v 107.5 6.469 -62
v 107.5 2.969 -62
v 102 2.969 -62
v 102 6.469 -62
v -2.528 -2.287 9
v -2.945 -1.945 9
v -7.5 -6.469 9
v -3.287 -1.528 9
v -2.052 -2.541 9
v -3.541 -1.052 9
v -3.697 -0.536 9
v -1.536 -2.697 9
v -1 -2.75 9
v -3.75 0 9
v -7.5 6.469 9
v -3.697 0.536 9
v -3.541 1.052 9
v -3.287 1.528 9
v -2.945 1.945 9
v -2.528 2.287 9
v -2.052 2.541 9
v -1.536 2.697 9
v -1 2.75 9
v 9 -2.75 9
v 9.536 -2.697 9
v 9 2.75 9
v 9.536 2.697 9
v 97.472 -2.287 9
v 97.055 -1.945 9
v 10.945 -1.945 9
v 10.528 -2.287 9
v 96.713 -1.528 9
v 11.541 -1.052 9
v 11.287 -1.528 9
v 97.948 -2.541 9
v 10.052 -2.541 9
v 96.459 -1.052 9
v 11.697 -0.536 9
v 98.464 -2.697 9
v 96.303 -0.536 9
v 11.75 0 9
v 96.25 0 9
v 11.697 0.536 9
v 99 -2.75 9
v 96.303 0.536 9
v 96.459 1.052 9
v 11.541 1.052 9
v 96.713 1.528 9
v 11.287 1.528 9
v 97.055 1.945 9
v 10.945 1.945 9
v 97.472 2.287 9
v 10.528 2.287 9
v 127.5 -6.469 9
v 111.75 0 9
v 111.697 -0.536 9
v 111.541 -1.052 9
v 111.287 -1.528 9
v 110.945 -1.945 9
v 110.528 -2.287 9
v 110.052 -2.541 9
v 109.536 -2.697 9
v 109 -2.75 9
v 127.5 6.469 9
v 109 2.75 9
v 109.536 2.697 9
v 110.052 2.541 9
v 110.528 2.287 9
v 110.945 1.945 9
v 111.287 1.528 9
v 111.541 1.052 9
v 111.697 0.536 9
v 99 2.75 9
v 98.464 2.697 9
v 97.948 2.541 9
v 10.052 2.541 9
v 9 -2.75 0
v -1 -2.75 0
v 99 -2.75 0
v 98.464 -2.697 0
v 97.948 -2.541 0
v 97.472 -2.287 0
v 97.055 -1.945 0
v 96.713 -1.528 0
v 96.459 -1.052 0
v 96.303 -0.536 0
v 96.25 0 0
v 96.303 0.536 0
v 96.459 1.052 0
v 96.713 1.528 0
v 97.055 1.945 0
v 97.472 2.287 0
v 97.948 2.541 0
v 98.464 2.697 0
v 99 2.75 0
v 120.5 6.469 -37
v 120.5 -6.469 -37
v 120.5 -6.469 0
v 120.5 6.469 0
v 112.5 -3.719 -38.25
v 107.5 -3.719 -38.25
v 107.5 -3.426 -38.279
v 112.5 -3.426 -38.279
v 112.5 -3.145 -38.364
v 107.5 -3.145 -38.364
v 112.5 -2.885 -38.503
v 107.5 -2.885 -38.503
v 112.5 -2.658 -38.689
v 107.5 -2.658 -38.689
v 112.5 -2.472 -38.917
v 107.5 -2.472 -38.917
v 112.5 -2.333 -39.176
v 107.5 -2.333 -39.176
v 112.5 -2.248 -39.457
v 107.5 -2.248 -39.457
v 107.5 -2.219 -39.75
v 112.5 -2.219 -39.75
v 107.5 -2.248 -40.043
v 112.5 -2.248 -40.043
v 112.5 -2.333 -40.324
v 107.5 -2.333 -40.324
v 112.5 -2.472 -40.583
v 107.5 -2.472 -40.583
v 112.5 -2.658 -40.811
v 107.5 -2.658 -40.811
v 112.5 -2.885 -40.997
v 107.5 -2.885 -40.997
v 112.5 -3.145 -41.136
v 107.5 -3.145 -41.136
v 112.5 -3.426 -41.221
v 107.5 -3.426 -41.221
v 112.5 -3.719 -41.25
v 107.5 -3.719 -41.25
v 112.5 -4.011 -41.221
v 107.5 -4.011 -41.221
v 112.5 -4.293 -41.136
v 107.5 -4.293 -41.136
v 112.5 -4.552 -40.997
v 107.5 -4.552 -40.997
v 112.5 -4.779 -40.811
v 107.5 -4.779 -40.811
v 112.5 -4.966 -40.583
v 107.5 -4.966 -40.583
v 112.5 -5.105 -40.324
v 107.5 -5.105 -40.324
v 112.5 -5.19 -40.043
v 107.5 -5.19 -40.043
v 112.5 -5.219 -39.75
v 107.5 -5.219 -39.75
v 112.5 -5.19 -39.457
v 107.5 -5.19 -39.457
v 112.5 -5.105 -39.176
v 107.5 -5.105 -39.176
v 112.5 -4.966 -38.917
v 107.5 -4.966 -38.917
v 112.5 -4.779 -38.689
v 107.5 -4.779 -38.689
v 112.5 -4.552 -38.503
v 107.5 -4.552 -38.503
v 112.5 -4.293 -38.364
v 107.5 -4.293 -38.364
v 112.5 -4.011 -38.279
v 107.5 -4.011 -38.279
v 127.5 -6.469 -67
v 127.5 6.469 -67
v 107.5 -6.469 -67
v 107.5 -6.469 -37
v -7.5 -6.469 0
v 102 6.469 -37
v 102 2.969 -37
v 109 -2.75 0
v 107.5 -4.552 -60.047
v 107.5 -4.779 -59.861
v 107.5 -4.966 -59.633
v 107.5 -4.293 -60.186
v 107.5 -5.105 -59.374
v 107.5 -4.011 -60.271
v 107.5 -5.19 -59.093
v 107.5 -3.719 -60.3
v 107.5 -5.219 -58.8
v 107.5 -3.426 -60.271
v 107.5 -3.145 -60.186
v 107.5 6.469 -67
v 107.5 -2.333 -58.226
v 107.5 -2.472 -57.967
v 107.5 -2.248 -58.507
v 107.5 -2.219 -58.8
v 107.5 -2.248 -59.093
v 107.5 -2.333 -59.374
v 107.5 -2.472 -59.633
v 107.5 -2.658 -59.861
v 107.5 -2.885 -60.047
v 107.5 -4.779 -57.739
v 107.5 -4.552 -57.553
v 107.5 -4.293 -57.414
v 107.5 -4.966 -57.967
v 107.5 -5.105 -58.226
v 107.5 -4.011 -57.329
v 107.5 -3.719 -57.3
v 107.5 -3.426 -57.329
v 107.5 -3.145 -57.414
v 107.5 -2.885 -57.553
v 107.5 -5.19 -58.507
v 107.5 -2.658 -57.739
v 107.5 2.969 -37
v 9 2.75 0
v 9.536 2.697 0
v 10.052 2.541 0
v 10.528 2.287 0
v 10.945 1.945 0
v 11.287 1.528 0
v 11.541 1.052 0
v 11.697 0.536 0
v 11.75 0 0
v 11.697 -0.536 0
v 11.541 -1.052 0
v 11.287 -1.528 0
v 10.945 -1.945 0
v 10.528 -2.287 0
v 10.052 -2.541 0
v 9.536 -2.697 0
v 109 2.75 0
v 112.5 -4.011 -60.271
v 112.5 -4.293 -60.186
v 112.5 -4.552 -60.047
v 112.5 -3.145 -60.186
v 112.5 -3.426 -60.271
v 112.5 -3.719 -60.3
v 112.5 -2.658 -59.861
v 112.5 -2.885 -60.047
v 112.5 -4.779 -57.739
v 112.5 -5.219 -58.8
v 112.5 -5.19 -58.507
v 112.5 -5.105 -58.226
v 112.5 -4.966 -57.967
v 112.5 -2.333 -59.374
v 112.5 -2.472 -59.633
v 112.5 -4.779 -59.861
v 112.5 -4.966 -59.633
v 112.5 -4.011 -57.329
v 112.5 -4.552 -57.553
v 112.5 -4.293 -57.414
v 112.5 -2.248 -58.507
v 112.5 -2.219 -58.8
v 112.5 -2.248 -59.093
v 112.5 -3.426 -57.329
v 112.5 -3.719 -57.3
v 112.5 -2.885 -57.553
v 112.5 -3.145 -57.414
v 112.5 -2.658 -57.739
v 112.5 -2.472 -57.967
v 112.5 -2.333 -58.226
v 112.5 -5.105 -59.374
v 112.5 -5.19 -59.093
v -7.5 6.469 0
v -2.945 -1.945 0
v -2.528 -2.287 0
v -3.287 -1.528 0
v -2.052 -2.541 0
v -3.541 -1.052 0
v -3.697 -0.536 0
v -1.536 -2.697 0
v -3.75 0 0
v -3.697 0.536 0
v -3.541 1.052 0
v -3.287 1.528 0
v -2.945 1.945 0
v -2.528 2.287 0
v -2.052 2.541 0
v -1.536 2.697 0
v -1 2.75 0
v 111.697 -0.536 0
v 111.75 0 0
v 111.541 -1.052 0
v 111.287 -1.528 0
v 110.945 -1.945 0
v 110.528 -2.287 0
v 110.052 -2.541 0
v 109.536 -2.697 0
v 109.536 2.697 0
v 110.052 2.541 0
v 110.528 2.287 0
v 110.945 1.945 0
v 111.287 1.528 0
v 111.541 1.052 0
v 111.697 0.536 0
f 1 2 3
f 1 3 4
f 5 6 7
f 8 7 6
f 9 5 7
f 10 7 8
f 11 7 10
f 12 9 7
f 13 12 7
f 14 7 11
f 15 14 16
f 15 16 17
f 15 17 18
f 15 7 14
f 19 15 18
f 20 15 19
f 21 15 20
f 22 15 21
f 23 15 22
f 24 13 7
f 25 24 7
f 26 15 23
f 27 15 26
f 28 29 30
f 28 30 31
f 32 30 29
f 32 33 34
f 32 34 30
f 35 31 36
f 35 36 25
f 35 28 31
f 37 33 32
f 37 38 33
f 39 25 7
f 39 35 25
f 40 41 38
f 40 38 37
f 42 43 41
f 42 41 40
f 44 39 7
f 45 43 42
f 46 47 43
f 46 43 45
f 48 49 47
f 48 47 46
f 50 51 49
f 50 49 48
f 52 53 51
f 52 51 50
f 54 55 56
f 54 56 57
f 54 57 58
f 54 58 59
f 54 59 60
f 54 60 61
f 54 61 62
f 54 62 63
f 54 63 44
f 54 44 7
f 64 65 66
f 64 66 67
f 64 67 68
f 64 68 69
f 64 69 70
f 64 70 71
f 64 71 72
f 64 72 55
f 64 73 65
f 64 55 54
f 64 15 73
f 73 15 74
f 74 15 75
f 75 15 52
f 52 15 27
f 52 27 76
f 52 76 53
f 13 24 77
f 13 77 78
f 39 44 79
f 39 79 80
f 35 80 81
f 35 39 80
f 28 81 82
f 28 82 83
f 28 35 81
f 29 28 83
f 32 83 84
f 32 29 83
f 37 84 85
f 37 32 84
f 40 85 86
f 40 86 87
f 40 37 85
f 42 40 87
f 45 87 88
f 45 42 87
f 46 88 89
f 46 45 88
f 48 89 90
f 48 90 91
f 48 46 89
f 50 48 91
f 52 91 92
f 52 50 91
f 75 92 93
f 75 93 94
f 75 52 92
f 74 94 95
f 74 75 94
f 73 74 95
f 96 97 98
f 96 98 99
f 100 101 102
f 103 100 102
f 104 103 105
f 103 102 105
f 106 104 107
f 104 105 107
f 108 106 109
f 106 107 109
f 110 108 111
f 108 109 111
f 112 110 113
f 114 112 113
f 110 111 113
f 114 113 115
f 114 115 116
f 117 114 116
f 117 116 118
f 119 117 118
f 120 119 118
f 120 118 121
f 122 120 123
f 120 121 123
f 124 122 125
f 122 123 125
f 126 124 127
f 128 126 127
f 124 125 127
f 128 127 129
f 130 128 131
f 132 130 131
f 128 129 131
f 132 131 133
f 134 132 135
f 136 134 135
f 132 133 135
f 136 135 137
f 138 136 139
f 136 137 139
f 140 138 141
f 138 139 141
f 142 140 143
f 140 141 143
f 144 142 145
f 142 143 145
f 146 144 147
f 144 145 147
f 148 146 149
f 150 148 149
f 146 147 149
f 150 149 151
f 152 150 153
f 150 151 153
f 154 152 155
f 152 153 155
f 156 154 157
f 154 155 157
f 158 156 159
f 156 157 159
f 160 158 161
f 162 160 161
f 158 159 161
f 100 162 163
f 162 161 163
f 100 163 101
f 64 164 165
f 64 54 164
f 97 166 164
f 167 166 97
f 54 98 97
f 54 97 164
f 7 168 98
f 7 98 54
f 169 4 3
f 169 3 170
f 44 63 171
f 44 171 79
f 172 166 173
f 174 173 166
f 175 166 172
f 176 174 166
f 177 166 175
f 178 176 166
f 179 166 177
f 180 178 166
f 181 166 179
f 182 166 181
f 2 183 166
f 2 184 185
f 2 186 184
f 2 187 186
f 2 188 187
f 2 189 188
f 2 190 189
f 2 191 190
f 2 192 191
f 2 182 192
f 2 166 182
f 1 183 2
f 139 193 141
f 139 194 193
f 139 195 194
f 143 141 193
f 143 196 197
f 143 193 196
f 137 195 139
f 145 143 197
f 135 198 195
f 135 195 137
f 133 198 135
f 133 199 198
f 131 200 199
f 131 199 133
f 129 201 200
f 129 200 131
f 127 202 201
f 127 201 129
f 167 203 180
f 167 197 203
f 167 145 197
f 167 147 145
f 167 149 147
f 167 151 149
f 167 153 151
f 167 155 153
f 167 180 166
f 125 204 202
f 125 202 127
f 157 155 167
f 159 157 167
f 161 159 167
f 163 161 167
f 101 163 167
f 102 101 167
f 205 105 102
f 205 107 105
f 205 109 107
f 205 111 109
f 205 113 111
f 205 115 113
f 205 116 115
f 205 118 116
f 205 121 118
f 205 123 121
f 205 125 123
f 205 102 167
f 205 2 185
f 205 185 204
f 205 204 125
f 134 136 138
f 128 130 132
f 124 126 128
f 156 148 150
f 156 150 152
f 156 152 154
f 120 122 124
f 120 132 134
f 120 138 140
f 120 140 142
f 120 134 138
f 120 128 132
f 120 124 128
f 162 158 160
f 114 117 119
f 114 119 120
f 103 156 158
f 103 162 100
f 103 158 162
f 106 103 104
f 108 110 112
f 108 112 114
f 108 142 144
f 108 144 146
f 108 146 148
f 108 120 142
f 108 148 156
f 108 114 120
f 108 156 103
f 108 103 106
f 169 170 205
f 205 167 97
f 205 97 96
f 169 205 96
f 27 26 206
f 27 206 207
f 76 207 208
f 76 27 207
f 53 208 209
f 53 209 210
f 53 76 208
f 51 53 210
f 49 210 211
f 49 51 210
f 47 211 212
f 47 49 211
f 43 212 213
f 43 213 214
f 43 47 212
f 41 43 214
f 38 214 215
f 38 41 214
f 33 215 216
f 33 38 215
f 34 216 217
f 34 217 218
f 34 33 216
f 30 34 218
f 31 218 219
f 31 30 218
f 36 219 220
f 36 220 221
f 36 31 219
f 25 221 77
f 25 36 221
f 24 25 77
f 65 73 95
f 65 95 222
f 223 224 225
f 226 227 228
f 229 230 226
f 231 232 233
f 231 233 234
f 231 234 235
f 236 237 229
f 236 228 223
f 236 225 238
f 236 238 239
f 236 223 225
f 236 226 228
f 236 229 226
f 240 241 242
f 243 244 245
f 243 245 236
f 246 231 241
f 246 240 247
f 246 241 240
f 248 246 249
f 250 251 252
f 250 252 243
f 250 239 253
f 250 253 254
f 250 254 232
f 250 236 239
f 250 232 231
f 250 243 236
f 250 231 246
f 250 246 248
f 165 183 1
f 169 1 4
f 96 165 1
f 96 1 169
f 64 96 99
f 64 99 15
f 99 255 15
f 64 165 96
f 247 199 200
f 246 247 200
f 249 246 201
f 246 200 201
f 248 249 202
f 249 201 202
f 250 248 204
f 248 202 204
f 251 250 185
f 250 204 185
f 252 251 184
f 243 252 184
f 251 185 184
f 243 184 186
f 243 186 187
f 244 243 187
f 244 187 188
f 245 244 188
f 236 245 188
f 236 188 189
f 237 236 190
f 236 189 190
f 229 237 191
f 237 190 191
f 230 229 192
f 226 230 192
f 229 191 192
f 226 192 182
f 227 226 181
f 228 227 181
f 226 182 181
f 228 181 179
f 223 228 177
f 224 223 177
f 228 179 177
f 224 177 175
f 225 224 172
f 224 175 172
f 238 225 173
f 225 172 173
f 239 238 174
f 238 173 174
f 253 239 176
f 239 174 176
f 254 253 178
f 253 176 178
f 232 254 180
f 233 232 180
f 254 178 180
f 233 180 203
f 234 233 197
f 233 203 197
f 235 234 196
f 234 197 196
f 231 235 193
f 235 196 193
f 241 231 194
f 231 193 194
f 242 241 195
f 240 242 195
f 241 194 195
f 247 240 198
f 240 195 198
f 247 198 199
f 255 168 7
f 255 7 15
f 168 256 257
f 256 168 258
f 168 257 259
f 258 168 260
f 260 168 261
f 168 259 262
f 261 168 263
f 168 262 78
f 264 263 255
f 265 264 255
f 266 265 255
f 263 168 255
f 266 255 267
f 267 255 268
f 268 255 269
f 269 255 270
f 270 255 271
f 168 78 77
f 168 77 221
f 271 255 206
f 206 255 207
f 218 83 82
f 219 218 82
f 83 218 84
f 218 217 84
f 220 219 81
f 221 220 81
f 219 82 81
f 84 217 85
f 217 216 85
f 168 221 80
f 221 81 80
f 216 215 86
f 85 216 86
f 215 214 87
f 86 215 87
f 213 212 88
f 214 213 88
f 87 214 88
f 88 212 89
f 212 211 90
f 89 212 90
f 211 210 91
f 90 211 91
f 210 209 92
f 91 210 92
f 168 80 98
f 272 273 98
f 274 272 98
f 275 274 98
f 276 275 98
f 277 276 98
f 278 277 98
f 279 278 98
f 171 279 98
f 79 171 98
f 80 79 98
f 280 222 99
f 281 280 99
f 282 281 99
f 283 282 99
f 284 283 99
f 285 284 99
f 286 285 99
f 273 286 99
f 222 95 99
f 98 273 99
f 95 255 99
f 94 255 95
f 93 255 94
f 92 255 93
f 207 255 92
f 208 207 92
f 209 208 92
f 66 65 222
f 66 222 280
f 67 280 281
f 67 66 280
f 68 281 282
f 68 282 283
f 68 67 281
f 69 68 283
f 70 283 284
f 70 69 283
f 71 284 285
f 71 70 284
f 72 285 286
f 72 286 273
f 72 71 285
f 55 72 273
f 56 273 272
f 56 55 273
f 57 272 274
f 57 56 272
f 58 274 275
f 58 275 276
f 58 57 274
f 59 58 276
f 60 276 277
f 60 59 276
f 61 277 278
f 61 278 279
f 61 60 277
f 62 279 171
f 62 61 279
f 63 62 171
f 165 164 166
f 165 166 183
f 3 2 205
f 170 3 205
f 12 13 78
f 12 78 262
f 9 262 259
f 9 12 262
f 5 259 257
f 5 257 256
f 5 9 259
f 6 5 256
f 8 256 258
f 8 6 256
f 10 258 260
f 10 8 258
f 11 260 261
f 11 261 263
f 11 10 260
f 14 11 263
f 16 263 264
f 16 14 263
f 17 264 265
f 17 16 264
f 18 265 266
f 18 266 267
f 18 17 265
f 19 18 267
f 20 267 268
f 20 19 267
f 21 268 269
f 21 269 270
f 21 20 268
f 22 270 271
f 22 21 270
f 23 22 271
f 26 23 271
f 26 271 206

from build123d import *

# Parameters (mm, degrees)
SKETCH1_W           = 135
SKETCH1_H           = 12.93762629
BOSS_EXTRUDE1_DEPTH = 9
SKETCH2_W           = 7
SKETCH2_H           = 12.93762629
BOSS_EXTRUDE2_DEPTH = 54
SKETCH3_W           = 7
SKETCH3_H           = 12.93762629
BOSS_EXTRUDE5_DEPTH = 13
BOSS_EXTRUDE6_REACH = 129.212
SKETCH6_W           = 30
SKETCH6_H           = 12.93762629
SKETCH7_R           = 1.5
CUT_EXTRUDE1_DEPTH  = 5
SKETCH9_W           = 25
SKETCH9_H           = 3.5
BOSS_EXTRUDE7_DEPTH = 5.5
CUT_EXTRUDE3_DEPTH  = 9


with BuildPart() as part:
    # Sketch1 → Boss-Extrude1 (new body)
    with BuildSketch(Plane.XY):
        with Locations((60, 0)):
            Rectangle(SKETCH1_W, SKETCH1_H)
    extrude(amount=BOSS_EXTRUDE1_DEPTH)

    # Sketch2 → Boss-Extrude2 (add)
    with BuildSketch(Plane(origin=(0, 0, 0), x_dir=(-1, 0, 0), z_dir=(0, 0, -1))):
        with Locations((-124, 0)):
            Rectangle(SKETCH2_W, SKETCH2_H)
    extrude(amount=BOSS_EXTRUDE2_DEPTH)

    # Sketch3 → Boss-Extrude5 (add)
    with BuildSketch(Plane.ZY.offset(-120.5)):
        with Locations((-50.5, 0)):
            Rectangle(SKETCH3_W, SKETCH3_H)
    extrude(amount=BOSS_EXTRUDE5_DEPTH)

    # Boss-Extrude6: up to this face of the body (flat: up to its plane)
    boss_extrude6_end = Plane(part.part.faces().sort_by_distance((127.5, 0, -22.5))[0])
    # Sketch6 → Boss-Extrude6 (add, up to the picked face)
    with BuildSketch(Plane.ZY.offset(-107.5), mode=Mode.PRIVATE) as boss_extrude6_sk1:
        with Locations((-52, 0)):
            Rectangle(SKETCH6_W, SKETCH6_H)
    boss_extrude6_tool1 = split(extrude(boss_extrude6_sk1.sketch, amount=-BOSS_EXTRUDE6_REACH, mode=Mode.PRIVATE), bisect_by=boss_extrude6_end, keep=Keep.BOTH, mode=Mode.PRIVATE)
    add(boss_extrude6_tool1.solids().sort_by(Axis((107.5, 0, -52), (1, 0, 0)))[0])

    # Sketch7 → Cut-Extrude1 (cut)
    with BuildSketch(Plane.ZY.offset(-107.5)):
        with Locations((-39.75, -3.718813145)):
            Circle(SKETCH7_R)
        with Locations((-58.8, -3.718813145)):
            Circle(SKETCH7_R)
    extrude(amount=-CUT_EXTRUDE1_DEPTH, mode=Mode.SUBTRACT)

    # Sketch9 → Boss-Extrude7 (add)
    with BuildSketch(Plane.ZY.offset(-107.5)):
        with Locations((-49.5, 4.718813145)):
            Rectangle(SKETCH9_W, SKETCH9_H)
    extrude(amount=BOSS_EXTRUDE7_DEPTH)

    # Sketch12 → Cut-Extrude3 (cut)
    with BuildSketch(Plane.XY.offset(9)):
        with BuildLine():
            Line((-1, 2.75), (9, 2.75))
            ThreePointArc((9, 2.75), (11.75, 0), (9, -2.75))
            Line((9, -2.75), (-1, -2.75))
            ThreePointArc((-1, -2.75), (-3.75, 0), (-1, 2.75))
        make_face()
        with BuildLine():
            Line((109, -2.75), (99, -2.75))
            ThreePointArc((99, -2.75), (96.25, 0), (99, 2.75))
            Line((99, 2.75), (109, 2.75))
            ThreePointArc((109, 2.75), (111.75, 0), (109, -2.75))
        make_face()
    extrude(amount=-CUT_EXTRUDE3_DEPTH, mode=Mode.SUBTRACT)


solid = part.part
